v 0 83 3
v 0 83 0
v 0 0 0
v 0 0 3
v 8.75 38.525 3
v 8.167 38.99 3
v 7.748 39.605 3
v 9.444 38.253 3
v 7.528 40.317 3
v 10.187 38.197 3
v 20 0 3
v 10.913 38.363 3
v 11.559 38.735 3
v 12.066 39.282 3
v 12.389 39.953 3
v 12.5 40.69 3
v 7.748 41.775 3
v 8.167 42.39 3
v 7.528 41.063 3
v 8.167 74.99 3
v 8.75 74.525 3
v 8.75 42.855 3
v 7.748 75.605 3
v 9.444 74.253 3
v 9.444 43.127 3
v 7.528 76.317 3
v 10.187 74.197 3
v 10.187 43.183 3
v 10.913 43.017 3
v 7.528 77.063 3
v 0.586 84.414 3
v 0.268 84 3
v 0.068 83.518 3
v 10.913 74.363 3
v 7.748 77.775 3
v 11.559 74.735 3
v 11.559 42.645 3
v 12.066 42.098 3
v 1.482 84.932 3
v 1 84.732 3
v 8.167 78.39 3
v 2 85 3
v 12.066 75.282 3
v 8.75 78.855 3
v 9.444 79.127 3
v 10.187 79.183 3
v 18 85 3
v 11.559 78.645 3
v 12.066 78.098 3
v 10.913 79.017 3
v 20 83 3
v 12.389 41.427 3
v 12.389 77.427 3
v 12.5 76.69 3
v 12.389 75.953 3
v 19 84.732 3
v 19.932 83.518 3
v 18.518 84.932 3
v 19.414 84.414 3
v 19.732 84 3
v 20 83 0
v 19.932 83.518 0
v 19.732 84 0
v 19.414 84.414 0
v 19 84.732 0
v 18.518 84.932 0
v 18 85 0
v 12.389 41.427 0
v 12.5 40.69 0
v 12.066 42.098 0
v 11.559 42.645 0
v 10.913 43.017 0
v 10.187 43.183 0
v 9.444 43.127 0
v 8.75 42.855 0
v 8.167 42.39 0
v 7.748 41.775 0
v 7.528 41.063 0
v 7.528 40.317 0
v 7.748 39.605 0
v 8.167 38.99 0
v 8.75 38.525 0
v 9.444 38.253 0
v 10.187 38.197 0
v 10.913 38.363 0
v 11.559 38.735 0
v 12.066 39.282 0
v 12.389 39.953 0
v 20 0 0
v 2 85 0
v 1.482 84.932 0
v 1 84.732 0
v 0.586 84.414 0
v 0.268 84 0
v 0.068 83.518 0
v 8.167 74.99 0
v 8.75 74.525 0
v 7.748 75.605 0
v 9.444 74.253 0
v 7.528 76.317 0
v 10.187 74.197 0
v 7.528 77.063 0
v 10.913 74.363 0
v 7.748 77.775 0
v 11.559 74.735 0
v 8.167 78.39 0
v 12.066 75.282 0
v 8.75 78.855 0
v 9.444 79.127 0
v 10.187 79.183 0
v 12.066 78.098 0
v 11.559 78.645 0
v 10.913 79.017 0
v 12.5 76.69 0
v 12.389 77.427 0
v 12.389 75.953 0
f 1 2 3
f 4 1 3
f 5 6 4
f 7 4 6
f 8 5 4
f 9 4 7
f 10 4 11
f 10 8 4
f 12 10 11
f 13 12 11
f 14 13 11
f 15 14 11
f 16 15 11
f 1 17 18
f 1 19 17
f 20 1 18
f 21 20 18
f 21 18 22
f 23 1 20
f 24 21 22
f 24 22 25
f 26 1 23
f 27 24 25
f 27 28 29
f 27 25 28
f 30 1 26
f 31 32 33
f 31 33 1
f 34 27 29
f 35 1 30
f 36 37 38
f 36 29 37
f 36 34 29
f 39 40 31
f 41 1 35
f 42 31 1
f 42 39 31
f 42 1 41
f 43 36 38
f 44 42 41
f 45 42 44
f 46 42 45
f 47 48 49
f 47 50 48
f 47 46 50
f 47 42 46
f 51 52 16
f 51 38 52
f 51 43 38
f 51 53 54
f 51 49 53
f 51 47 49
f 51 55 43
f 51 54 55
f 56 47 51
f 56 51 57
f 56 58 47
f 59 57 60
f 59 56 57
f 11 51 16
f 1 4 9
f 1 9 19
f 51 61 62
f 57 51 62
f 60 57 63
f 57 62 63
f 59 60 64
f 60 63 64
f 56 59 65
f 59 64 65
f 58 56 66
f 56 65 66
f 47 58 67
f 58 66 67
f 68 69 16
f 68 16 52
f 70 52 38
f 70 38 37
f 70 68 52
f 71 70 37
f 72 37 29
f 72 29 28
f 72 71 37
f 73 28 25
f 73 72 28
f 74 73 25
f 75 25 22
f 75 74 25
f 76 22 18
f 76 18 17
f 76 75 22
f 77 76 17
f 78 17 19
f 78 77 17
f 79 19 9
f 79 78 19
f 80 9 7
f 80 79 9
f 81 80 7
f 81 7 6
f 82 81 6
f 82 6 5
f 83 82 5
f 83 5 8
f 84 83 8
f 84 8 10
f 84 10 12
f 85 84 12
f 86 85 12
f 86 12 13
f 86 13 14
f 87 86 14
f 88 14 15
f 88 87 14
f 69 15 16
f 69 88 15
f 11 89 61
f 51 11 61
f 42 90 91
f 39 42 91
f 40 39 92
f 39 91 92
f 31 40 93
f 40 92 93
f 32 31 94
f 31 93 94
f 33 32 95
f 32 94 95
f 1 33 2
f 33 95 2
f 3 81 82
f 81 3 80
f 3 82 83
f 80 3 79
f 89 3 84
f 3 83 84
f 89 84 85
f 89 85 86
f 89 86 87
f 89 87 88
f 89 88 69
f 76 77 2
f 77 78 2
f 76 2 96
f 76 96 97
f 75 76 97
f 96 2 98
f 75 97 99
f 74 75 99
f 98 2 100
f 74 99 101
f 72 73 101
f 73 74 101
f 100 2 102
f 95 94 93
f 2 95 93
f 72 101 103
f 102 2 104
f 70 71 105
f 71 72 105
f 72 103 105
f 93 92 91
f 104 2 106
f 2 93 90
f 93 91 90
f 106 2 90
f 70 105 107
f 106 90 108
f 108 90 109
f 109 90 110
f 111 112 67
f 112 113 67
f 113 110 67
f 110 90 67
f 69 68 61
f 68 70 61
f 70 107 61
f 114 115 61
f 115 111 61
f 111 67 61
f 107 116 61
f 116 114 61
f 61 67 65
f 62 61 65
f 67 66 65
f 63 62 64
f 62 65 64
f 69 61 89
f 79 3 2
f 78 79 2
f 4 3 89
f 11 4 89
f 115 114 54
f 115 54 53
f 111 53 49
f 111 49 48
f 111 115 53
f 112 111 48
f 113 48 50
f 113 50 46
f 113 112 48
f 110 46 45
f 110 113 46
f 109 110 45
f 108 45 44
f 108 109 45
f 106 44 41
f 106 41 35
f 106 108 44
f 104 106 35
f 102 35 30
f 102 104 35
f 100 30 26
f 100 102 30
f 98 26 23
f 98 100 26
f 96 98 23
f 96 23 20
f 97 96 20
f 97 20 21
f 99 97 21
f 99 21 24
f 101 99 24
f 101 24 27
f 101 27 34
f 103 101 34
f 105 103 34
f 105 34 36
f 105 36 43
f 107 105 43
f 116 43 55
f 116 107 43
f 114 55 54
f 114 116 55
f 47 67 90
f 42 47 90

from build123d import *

# Parameters (mm, degrees)
CROQUIS1_R              = 2.5
SALIENTE_EXTRUIR1_DEPTH = 3


with BuildPart() as part:
    # Croquis1 → Saliente-Extruir1 (new body)
    with BuildSketch(Plane.XY):
        with BuildLine():
            Line((20, 0), (20, 83))
            ThreePointArc((20, 83), (19.414213562, 84.414213562), (18, 85))
            Line((18, 85), (2, 85))
            ThreePointArc((2, 85), (0.585786438, 84.414213562), (0, 83))
            Line((0, 83), (0, 0))
            Line((0, 0), (20, 0))
        make_face()
        with Locations((10, 76.69)):
            Circle(CROQUIS1_R, mode=Mode.SUBTRACT)
        with Locations((10, 40.69)):
            Circle(CROQUIS1_R, mode=Mode.SUBTRACT)
    extrude(amount=SALIENTE_EXTRUIR1_DEPTH)


solid = part.part
